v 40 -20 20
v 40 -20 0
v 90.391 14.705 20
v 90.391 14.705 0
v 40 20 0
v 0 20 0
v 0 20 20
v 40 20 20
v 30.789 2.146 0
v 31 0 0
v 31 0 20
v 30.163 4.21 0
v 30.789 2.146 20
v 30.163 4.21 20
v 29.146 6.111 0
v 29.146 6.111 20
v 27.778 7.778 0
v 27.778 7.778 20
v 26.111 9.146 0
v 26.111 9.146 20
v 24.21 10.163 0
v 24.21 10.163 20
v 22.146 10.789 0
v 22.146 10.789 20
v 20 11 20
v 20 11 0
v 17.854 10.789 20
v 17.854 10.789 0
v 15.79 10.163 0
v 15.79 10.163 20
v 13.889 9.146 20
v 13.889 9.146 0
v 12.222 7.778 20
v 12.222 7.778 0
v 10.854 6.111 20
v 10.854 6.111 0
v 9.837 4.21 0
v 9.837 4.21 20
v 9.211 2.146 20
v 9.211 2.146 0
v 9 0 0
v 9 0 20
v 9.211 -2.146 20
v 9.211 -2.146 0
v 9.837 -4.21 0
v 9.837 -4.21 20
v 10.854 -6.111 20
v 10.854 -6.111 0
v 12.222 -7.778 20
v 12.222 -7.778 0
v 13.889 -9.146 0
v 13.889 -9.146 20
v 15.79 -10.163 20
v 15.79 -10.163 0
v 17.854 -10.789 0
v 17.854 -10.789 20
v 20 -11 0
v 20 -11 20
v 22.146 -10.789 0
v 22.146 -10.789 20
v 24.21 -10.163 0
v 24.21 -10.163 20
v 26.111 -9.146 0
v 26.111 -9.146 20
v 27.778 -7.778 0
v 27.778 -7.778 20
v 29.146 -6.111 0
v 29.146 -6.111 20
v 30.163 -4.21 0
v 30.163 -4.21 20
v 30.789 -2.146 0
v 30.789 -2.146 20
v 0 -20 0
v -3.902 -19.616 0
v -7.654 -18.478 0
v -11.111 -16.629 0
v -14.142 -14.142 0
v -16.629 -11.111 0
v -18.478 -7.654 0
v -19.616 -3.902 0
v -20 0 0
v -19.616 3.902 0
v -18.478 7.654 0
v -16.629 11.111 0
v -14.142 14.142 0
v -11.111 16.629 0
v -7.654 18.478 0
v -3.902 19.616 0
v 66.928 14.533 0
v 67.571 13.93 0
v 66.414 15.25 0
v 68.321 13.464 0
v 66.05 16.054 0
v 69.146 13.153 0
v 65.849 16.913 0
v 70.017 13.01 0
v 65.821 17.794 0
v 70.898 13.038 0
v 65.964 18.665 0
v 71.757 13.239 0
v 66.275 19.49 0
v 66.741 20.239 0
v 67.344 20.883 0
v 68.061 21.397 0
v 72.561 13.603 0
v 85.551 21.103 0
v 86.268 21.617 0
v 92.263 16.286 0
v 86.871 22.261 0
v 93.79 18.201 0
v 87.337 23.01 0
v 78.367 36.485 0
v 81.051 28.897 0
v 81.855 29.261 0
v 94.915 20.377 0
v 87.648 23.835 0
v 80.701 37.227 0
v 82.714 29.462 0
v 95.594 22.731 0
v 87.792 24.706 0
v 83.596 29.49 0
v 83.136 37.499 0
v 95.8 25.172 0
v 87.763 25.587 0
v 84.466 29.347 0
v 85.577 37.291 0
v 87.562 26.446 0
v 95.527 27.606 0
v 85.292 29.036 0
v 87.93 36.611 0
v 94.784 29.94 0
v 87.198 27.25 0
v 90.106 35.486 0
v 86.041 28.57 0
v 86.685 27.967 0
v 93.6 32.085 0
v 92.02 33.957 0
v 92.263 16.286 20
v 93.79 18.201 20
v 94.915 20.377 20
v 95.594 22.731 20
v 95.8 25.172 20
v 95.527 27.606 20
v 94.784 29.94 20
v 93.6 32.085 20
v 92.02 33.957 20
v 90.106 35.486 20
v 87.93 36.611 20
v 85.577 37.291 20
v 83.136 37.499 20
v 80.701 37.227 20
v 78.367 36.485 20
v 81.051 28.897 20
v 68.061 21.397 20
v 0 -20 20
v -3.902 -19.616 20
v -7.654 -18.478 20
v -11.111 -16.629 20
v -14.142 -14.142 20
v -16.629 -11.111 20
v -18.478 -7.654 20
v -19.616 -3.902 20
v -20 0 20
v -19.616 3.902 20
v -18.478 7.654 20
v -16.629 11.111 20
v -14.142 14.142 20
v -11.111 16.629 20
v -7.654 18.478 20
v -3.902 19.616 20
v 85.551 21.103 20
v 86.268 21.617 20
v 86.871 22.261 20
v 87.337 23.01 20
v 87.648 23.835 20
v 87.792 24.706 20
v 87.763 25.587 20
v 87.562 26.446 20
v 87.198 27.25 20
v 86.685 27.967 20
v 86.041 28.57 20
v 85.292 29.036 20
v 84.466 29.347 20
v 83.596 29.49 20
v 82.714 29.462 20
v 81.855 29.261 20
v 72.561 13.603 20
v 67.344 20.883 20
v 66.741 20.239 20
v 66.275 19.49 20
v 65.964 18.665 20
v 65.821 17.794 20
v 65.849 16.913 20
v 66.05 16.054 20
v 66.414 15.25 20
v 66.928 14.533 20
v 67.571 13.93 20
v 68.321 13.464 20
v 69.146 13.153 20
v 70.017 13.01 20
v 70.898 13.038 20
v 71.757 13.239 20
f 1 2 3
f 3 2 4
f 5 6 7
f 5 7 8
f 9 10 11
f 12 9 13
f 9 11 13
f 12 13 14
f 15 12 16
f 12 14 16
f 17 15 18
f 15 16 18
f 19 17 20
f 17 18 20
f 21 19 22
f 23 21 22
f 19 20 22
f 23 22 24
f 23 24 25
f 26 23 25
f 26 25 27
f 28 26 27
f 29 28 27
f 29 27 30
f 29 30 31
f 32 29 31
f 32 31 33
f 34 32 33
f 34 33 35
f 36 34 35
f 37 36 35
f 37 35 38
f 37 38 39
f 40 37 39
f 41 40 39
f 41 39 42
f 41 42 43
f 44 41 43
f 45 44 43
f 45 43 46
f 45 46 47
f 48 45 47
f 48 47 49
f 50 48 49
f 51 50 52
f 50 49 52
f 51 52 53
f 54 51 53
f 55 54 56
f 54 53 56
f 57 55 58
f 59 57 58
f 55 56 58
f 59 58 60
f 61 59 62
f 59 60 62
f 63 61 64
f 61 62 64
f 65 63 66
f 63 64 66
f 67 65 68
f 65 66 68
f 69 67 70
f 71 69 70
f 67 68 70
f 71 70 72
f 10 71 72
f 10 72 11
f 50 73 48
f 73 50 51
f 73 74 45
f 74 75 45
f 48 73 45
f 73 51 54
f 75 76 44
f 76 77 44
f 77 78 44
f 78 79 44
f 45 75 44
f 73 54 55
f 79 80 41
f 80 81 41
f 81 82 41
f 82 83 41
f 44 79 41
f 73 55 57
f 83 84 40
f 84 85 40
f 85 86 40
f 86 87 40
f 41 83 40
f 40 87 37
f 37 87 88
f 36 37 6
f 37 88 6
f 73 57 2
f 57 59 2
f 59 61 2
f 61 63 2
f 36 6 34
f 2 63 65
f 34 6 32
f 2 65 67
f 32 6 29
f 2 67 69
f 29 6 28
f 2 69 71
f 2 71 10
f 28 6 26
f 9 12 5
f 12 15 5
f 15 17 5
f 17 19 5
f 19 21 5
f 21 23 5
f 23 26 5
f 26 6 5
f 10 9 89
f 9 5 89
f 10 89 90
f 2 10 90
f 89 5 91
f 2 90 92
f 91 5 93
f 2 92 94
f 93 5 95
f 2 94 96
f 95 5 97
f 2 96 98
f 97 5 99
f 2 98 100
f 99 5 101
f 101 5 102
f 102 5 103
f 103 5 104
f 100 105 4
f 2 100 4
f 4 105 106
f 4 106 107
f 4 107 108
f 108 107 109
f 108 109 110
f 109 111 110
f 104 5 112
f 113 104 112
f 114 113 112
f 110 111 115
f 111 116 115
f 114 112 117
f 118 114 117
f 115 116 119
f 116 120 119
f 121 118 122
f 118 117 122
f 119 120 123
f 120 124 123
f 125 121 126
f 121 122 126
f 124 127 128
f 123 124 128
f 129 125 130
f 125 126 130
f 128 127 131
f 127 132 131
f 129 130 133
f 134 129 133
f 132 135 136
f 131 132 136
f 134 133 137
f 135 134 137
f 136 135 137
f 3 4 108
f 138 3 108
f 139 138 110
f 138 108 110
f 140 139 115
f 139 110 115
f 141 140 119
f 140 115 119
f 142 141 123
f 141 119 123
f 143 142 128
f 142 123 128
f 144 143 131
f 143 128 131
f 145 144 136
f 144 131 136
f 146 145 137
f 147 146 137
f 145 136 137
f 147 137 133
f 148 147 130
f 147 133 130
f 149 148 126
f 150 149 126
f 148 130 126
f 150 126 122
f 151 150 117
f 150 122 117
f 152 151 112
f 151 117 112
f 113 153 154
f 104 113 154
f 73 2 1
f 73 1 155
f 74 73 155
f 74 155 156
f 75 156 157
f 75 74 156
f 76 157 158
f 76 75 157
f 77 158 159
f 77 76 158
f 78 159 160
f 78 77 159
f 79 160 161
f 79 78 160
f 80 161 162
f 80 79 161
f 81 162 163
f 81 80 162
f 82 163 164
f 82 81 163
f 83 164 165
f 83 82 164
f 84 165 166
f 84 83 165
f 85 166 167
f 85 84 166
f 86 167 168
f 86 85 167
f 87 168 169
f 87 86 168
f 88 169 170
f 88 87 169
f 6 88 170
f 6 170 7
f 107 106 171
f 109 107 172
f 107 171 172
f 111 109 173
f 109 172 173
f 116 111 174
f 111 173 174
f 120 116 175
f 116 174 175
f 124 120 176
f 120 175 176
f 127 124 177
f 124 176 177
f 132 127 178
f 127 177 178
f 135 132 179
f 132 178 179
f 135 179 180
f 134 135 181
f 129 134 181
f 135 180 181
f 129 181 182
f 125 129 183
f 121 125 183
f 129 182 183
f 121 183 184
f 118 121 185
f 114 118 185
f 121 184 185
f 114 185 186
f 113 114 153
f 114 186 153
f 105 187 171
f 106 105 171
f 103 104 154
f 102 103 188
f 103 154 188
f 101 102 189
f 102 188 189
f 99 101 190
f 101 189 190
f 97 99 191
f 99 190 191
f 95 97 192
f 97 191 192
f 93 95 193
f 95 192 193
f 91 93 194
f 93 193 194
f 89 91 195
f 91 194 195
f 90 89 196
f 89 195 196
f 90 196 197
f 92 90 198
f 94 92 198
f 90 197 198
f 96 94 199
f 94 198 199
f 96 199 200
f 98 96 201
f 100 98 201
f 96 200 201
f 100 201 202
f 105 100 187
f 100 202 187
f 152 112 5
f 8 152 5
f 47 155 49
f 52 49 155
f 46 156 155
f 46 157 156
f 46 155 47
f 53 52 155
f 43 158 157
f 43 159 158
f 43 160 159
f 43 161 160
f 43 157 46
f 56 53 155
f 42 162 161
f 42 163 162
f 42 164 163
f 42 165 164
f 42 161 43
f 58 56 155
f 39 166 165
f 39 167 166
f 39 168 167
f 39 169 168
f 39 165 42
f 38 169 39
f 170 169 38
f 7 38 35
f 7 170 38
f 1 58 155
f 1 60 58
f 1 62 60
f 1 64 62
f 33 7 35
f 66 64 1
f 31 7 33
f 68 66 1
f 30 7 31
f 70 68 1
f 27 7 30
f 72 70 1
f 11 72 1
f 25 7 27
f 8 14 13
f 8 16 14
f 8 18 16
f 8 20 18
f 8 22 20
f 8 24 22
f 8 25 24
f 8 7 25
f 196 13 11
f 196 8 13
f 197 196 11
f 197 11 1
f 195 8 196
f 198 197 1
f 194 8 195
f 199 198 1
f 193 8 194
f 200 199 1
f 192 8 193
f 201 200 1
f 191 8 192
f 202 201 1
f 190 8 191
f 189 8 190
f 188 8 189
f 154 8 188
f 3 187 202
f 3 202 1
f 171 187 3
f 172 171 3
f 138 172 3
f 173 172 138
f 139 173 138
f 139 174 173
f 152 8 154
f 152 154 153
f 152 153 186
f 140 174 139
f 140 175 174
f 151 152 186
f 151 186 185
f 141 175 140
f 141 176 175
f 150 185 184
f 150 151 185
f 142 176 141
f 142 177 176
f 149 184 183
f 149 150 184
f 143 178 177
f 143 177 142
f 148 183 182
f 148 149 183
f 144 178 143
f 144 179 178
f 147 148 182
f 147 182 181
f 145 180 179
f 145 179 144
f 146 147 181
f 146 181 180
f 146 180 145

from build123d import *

# Parameters (mm, degrees)
EXTRUDE_1_DEPTH     = 20
SKETCH_2_R          = 12.5
EXTRUDE_2_DEPTH     = 20
SKETCH_3_R          = 4.5
SKETCH_3_R_2        = 11
CUT_EXTRUDE_1_DEPTH = 105.805216329


with BuildPart() as part:
    # Эскиз1 → Бобышка-Вытянуть1 (new body)
    with BuildSketch(Plane.XY):
        with BuildLine():
            Line((0, 20), (40, 20))
            Line((40, 20), (40, -20))
            Line((40, -20), (0, -20))
            ThreePointArc((0, -20), (-20, 0), (0, 20))
        make_face()
    extrude(amount=EXTRUDE_1_DEPTH)

    # Эскиз2 → Бобышка-Вытянуть2 (add)
    with BuildSketch(Plane.XY):
        with BuildLine():
            ThreePointArc((90.39137509, 14.705321156), (72.358344337, 18.958280561), (78.366684393, 36.484766564))
            Line((78.366684393, 36.484766564), (40, 20))
            Line((40, 20), (40, -20))
            Line((40, -20), (90.39137509, 14.705321156))
        make_face()
        with Locations((83.301270189, 25)):
            Circle(SKETCH_2_R)
    extrude(amount=EXTRUDE_2_DEPTH)

    # Эскиз3 → Вырез-Вытянуть1 (cut, through all)
    with BuildSketch(Plane.XY.offset(20)):
        with BuildLine():
            ThreePointArc((85.551270189, 21.102885683), (79.404155872, 22.75), (81.051270189, 28.897114317))
            Line((81.051270189, 28.897114317), (68.060889132, 21.397114317))
            ThreePointArc((68.060889132, 21.397114317), (72.560889132, 21.397114317), (74.810889132, 17.5))
            ThreePointArc((74.810889132, 17.5), (74.208003449, 15.25), (72.560889132, 13.602885683))
            Line((72.560889132, 13.602885683), (85.551270189, 21.102885683))
        make_face()
        with Locations((83.301270189, 25)):
            Circle(SKETCH_3_R)
        with Locations((20, 0)):
            Circle(SKETCH_3_R_2)
        with Locations((70.310889132, 17.5)):
            Circle(SKETCH_3_R)
    extrude(amount=-CUT_EXTRUDE_1_DEPTH, mode=Mode.SUBTRACT)


solid = part.part
